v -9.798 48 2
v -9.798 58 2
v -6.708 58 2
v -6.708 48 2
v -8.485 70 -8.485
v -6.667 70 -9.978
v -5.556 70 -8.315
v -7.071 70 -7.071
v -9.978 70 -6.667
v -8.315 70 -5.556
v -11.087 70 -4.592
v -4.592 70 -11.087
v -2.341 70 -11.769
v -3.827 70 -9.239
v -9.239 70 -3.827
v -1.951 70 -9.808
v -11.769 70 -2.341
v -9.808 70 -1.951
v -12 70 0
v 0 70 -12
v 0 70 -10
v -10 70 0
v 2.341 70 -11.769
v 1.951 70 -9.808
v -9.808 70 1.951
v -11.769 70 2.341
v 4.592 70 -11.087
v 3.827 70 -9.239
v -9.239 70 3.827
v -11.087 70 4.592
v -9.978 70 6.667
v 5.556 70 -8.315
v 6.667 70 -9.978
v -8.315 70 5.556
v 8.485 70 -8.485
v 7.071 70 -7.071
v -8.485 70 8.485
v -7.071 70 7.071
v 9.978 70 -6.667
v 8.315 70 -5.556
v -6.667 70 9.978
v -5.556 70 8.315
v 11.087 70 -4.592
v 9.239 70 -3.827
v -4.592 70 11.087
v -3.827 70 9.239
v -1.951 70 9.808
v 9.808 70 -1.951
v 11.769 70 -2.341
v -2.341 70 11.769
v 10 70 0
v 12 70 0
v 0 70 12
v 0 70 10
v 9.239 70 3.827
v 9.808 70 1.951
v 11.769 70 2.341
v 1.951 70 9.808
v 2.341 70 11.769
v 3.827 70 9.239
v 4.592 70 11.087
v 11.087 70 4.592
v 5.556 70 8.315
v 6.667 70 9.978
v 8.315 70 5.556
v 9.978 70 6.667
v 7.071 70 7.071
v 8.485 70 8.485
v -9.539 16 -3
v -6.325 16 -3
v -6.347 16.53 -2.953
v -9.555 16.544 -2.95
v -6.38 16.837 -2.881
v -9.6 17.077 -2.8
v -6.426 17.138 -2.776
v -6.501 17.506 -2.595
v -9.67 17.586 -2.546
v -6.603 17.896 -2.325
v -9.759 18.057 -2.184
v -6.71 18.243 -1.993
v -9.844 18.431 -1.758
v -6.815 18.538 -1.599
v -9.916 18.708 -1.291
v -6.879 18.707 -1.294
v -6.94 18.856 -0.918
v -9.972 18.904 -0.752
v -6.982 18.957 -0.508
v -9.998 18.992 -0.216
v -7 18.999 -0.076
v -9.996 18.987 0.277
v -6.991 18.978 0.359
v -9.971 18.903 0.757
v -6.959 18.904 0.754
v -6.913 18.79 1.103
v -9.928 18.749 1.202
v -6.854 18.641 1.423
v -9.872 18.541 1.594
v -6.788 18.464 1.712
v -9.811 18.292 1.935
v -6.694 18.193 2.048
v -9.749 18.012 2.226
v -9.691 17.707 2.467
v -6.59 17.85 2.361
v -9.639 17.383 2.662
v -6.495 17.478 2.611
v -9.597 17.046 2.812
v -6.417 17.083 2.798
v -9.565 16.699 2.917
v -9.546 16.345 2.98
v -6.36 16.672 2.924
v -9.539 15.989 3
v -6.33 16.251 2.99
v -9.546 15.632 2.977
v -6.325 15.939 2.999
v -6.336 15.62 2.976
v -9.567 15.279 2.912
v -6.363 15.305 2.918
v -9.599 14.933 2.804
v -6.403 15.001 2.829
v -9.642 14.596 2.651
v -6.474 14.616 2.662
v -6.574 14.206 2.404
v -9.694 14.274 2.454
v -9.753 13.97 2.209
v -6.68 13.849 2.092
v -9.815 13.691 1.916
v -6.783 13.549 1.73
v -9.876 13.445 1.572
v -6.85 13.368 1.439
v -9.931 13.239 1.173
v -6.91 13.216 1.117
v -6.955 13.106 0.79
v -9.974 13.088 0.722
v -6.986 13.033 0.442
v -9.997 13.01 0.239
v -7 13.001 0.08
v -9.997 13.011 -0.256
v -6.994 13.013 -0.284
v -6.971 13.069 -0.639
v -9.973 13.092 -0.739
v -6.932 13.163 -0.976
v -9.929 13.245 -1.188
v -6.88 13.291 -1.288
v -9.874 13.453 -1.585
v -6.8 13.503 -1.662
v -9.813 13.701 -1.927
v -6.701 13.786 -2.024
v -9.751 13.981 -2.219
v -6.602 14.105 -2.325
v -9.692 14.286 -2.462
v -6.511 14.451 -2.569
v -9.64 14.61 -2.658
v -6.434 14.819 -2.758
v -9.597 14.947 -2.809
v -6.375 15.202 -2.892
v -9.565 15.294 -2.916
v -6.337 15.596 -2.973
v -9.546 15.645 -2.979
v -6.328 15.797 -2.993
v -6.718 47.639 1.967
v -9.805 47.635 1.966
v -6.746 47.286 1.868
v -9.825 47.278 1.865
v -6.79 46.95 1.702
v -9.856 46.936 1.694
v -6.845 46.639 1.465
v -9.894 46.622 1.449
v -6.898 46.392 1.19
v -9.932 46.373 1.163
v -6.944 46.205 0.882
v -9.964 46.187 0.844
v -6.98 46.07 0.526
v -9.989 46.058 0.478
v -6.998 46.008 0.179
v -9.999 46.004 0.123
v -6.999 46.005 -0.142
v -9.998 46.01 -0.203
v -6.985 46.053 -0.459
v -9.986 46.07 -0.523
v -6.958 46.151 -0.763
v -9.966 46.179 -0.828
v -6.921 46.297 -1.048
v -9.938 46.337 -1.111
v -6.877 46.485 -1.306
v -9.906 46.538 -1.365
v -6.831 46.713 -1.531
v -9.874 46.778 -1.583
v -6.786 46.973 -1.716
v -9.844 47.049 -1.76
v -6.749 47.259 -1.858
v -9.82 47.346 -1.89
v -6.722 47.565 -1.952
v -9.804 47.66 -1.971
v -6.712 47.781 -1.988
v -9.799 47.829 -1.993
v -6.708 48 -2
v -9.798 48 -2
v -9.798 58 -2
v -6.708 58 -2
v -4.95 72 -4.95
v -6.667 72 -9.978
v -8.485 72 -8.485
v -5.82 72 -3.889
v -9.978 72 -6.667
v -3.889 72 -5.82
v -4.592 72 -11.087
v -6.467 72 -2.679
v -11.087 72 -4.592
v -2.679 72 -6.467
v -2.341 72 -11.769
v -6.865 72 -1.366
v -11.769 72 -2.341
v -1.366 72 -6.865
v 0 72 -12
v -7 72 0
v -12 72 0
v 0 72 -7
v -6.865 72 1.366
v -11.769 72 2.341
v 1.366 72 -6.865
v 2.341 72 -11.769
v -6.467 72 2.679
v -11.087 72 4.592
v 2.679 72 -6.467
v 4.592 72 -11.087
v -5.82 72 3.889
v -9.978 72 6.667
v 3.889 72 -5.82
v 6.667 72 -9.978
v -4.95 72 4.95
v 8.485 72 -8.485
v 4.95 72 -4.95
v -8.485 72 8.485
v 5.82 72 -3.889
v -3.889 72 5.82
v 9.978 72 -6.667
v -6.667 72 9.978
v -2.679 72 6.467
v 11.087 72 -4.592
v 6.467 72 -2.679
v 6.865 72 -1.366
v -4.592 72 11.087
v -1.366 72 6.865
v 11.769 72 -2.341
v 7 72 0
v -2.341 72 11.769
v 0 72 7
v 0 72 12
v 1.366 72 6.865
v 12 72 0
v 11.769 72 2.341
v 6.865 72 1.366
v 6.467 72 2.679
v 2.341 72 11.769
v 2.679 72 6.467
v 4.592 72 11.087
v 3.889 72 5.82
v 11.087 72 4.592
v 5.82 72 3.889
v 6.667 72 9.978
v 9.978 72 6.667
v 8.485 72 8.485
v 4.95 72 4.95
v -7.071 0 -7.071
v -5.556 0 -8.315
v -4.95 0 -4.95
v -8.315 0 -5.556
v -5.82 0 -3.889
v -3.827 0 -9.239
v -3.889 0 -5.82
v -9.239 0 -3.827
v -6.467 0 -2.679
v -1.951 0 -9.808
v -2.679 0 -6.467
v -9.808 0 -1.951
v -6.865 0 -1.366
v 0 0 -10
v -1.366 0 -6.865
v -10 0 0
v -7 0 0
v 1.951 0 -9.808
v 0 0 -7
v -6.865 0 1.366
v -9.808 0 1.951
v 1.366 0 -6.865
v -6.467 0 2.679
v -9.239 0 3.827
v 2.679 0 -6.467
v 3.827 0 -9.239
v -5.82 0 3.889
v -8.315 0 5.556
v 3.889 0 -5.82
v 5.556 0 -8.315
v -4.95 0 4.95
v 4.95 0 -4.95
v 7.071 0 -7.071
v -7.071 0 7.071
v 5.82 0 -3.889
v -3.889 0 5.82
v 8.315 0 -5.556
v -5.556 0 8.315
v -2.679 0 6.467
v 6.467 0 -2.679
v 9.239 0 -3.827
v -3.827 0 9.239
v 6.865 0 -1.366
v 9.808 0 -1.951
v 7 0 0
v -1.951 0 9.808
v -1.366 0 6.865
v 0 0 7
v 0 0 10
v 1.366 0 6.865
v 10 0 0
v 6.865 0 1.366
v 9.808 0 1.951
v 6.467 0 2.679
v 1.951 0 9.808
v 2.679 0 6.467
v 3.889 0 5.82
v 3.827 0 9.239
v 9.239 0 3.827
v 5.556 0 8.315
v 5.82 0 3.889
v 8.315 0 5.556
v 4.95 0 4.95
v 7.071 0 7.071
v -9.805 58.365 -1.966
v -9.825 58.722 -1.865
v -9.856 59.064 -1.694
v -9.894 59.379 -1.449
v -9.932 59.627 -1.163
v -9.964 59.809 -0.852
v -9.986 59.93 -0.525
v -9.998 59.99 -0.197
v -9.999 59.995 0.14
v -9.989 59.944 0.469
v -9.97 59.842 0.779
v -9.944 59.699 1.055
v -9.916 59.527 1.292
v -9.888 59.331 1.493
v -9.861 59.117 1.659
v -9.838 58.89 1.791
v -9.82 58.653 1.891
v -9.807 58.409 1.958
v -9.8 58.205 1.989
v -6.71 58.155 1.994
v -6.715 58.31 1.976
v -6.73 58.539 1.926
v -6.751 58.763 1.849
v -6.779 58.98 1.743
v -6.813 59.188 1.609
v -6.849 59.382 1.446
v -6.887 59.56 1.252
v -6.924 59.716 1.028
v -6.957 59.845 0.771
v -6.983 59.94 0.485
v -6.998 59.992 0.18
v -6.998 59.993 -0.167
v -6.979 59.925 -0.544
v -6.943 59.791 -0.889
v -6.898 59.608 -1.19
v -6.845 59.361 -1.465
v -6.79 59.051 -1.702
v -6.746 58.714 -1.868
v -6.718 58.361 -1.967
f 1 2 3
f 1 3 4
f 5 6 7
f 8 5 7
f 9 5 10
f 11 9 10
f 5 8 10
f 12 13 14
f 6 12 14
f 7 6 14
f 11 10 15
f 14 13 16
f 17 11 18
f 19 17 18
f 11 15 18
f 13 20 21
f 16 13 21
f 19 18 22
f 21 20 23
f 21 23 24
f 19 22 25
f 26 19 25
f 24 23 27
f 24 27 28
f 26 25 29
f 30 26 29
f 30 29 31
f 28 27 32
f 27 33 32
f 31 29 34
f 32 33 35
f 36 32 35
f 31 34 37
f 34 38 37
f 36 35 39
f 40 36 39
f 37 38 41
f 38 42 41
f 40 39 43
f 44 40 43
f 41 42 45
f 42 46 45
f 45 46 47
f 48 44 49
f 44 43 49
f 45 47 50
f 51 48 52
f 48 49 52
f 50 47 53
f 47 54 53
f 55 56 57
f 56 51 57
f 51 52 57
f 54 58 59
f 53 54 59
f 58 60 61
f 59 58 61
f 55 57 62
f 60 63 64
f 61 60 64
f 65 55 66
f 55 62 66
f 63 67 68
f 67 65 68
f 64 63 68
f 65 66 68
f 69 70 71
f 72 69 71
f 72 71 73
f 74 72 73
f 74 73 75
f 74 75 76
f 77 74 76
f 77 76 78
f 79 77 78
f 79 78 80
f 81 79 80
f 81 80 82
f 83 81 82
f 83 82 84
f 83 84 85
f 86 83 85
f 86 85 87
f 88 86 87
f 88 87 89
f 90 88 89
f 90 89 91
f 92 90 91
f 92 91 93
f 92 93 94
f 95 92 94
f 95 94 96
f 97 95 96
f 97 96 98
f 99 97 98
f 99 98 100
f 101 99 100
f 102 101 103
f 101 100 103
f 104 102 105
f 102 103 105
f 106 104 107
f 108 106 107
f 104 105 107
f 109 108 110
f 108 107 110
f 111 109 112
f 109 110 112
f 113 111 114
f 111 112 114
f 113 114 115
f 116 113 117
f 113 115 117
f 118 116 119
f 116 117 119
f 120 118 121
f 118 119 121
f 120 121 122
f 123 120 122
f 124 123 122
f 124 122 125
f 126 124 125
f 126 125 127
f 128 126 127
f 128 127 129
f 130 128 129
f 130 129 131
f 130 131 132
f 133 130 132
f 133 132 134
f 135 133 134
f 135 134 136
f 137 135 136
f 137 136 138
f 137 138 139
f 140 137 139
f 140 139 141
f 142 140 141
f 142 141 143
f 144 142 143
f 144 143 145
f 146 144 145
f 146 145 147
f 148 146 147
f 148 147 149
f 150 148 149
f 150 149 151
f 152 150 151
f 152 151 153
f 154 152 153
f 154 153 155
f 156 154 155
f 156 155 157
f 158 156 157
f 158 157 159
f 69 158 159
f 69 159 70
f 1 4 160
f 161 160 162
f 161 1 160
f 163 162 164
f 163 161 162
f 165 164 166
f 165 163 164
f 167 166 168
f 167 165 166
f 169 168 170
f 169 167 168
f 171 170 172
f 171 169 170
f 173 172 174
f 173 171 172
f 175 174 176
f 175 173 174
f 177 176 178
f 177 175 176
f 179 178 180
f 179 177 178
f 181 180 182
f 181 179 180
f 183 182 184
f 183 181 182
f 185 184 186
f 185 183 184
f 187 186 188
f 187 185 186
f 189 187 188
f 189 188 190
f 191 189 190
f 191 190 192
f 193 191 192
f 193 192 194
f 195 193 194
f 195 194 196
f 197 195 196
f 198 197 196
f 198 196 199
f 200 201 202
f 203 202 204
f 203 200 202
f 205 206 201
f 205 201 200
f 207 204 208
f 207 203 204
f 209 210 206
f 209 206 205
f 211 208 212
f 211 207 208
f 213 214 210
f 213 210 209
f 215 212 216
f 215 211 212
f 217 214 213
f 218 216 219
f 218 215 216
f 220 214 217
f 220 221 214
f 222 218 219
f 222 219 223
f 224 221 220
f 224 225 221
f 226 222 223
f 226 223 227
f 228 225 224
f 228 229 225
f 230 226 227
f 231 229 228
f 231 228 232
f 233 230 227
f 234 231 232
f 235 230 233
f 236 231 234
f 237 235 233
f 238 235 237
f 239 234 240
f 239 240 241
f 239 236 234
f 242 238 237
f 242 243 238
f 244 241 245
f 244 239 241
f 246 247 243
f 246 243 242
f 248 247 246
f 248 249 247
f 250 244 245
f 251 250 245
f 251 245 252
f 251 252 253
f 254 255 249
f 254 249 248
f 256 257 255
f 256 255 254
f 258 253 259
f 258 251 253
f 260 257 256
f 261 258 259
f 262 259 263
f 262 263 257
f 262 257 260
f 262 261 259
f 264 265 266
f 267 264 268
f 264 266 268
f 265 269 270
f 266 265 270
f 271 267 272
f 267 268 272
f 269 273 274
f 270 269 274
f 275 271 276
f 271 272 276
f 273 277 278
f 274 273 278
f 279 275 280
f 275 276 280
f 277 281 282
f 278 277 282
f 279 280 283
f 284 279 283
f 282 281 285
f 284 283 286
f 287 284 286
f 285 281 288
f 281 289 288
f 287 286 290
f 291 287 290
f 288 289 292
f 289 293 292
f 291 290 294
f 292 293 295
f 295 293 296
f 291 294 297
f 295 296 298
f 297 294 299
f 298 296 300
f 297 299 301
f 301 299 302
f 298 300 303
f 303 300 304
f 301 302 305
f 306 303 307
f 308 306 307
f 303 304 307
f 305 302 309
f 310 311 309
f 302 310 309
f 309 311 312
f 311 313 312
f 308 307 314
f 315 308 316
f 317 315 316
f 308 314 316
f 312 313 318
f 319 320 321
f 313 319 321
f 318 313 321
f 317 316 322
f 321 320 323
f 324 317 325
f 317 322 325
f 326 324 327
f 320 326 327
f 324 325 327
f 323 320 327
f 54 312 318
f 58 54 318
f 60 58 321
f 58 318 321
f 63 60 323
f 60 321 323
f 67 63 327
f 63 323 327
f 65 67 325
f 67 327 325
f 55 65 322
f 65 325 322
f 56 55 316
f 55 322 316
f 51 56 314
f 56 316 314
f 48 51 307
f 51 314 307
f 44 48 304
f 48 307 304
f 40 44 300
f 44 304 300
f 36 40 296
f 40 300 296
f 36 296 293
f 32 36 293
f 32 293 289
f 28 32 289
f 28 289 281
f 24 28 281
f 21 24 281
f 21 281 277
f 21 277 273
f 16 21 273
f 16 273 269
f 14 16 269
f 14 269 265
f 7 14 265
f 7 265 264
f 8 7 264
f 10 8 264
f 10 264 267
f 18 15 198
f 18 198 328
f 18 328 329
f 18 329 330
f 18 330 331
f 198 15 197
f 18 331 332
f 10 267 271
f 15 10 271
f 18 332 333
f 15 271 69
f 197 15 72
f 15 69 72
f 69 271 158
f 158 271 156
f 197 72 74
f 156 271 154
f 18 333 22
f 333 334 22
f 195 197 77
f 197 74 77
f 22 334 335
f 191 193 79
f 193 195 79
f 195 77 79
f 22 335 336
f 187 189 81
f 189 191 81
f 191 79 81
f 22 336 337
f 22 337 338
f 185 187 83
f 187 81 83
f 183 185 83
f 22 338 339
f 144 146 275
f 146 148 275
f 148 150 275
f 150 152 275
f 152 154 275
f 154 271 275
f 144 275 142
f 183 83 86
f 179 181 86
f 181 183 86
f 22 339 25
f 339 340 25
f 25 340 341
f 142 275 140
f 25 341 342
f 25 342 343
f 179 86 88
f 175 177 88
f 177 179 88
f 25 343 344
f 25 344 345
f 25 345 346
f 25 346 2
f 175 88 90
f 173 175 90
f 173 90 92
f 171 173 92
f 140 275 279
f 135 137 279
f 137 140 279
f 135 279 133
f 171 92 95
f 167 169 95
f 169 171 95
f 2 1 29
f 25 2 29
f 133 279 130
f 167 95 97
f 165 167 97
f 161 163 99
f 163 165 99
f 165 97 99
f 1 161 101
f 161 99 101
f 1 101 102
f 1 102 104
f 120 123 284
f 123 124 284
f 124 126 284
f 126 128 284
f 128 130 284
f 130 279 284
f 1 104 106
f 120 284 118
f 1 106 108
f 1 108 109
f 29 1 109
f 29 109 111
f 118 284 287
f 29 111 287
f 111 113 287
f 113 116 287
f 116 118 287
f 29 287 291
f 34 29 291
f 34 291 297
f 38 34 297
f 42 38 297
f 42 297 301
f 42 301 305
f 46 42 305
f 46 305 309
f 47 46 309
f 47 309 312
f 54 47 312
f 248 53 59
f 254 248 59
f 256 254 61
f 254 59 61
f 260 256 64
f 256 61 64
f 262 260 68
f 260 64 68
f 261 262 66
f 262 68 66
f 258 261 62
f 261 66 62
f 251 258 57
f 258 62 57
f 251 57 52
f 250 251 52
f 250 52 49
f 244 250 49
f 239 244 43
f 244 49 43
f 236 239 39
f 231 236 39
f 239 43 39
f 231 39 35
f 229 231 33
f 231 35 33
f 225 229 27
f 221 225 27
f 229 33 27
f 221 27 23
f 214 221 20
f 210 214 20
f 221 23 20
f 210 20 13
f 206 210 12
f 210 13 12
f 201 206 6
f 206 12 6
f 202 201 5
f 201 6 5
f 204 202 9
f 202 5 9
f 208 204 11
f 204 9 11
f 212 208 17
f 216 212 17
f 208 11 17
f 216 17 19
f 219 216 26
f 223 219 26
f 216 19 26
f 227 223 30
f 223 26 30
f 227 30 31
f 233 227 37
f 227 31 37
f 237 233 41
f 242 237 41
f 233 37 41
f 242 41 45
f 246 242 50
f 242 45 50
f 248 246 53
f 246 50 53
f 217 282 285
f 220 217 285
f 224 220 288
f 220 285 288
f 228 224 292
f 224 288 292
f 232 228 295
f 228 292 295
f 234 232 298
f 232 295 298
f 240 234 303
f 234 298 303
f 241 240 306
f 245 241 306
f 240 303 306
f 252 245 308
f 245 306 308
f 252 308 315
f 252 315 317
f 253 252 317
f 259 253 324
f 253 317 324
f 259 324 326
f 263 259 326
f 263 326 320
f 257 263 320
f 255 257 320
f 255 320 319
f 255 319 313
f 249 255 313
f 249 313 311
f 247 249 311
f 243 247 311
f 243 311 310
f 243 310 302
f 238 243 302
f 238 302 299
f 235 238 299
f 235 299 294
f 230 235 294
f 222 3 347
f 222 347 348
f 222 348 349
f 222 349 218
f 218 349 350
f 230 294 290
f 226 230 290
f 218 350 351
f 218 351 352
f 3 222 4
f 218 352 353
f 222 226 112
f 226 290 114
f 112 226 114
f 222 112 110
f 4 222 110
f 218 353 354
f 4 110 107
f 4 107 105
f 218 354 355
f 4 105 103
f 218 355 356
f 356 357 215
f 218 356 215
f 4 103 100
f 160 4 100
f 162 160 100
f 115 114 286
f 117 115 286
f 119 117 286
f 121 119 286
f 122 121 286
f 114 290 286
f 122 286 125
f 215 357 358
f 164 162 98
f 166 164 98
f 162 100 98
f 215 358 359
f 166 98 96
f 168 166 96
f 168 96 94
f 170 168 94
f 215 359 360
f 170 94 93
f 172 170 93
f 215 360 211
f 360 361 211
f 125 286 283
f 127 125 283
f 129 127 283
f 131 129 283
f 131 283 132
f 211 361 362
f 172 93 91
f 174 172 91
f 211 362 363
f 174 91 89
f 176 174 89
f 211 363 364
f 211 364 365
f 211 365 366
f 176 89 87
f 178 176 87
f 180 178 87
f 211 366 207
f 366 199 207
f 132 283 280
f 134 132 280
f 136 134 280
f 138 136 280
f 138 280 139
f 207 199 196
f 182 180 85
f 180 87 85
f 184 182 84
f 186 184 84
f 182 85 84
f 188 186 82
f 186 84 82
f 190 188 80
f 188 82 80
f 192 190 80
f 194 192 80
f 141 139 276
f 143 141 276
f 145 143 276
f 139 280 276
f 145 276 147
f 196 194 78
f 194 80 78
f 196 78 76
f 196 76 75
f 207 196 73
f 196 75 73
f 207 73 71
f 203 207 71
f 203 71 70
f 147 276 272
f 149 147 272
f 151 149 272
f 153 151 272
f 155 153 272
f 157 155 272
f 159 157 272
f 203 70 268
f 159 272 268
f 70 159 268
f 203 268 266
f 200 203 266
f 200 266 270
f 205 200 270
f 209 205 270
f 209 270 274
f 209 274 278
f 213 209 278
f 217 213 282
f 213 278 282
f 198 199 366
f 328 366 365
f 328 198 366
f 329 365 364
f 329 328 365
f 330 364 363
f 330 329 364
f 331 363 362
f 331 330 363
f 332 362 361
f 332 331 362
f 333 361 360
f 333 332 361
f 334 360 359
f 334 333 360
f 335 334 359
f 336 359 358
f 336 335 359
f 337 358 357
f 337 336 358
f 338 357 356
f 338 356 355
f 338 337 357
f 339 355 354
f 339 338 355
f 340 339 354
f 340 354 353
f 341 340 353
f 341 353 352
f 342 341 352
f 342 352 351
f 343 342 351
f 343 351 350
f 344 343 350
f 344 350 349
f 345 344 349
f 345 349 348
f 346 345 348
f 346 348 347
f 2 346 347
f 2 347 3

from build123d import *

# Parameters (mm, degrees)
SKETCH4_R               = 10
BOSS_EXTRUDE2_DEPTH     = 70
SKETCH5_R               = 12
BOSS_EXTRUDE3_DEPTH     = 2
CUT_EXTRUDE1_REACH      = 75.973
SKETCH6_R               = 7
CUT_EXTRUDE3_REACH      = 75.973
CUT_EXTRUDE3_END_RADIUS = 10
SKETCH7_R               = 3
CUT_EXTRUDE5_DEPTH      = 1
CUT_EXTRUDE5_DEPTH_BACK = 74.972968133
SKETCH7_4_R             = 2


with BuildPart() as part:
    # Sketch4 → Boss-Extrude2 (new body)
    with BuildSketch(Plane(origin=(0, 0, 0), x_dir=(1, 0, 0), z_dir=(0, 1, 0))):
        with Locations(Location((0, 0, 0), (0, 0, 270))):
            Circle(SKETCH4_R)
    extrude(amount=BOSS_EXTRUDE2_DEPTH)

    # Sketch5 → Boss-Extrude3 (add)
    with BuildSketch(Plane(origin=(0, 70, 0), x_dir=(1, 0, 0), z_dir=(0, 1, 0))):
        with Locations(Location((0, 0, 0), (0, 0, 270))):
            Circle(SKETCH5_R)
    extrude(amount=BOSS_EXTRUDE3_DEPTH)

    # Sketch6 → Cut-Extrude1 (cut, up to next)
    with BuildSketch(Plane.XZ, mode=Mode.PRIVATE) as cut_extrude1_sk1:
        with Locations(Location((0, 0, 0), (0, 0, 270))):
            Circle(SKETCH6_R)
    cut_extrude1_tool1 = extrude(cut_extrude1_sk1.sketch, amount=-CUT_EXTRUDE1_REACH, mode=Mode.PRIVATE) & part.part
    add(cut_extrude1_tool1.solids().sort_by_distance((0, 0, 0))[0], mode=Mode.SUBTRACT)

    # Cut-Extrude3: up to this cylinder (the profile starts inside it)
    cut_extrude3_end = Plane(origin=(0, 16, 0), z_dir=(0, -1, 0)) * Cylinder(CUT_EXTRUDE3_END_RADIUS, 172.946, mode=Mode.PRIVATE)
    # Sketch7 → Cut-Extrude3 (cut, up to the surface)
    with BuildSketch(Plane(origin=(0, 0, 0), x_dir=(0, 0, -1), z_dir=(1, 0, 0)), mode=Mode.PRIVATE) as cut_extrude3_sk1:
        with Locations((0, 16)):
            Circle(SKETCH7_R)
    cut_extrude3_tool1 = extrude(cut_extrude3_sk1.sketch, amount=-CUT_EXTRUDE3_REACH, mode=Mode.PRIVATE) & cut_extrude3_end
    add(cut_extrude3_tool1.solids().sort_by_distance((0, 16, 0))[0], mode=Mode.SUBTRACT)

    # Sketch7<4> → Cut-Extrude5 (cut, two sides: drawn at the far end of the back side and taken through both)
    with BuildSketch(Plane(origin=(0, 0, 0), x_dir=(0, 0, -1), z_dir=(1, 0, 0)).offset(-CUT_EXTRUDE5_DEPTH_BACK)):
        with BuildLine():
            Line((2, 53), (2, 58))
            ThreePointArc((2, 58), (0, 60), (-2, 58))
            Line((-2, 58), (-2, 53))
            ThreePointArc((-2, 53), (0, 55), (2, 53))
        make_face()
        with Locations((0, 53)):
            Circle(SKETCH7_4_R)
        with BuildLine():
            Line((2, 48), (2, 53))
            ThreePointArc((2, 53), (0, 51), (-2, 53))
            Line((-2, 53), (-2, 48))
            ThreePointArc((-2, 48), (0, 46), (2, 48))
        make_face()
    extrude(amount=CUT_EXTRUDE5_DEPTH + CUT_EXTRUDE5_DEPTH_BACK, mode=Mode.SUBTRACT)


solid = part.part
